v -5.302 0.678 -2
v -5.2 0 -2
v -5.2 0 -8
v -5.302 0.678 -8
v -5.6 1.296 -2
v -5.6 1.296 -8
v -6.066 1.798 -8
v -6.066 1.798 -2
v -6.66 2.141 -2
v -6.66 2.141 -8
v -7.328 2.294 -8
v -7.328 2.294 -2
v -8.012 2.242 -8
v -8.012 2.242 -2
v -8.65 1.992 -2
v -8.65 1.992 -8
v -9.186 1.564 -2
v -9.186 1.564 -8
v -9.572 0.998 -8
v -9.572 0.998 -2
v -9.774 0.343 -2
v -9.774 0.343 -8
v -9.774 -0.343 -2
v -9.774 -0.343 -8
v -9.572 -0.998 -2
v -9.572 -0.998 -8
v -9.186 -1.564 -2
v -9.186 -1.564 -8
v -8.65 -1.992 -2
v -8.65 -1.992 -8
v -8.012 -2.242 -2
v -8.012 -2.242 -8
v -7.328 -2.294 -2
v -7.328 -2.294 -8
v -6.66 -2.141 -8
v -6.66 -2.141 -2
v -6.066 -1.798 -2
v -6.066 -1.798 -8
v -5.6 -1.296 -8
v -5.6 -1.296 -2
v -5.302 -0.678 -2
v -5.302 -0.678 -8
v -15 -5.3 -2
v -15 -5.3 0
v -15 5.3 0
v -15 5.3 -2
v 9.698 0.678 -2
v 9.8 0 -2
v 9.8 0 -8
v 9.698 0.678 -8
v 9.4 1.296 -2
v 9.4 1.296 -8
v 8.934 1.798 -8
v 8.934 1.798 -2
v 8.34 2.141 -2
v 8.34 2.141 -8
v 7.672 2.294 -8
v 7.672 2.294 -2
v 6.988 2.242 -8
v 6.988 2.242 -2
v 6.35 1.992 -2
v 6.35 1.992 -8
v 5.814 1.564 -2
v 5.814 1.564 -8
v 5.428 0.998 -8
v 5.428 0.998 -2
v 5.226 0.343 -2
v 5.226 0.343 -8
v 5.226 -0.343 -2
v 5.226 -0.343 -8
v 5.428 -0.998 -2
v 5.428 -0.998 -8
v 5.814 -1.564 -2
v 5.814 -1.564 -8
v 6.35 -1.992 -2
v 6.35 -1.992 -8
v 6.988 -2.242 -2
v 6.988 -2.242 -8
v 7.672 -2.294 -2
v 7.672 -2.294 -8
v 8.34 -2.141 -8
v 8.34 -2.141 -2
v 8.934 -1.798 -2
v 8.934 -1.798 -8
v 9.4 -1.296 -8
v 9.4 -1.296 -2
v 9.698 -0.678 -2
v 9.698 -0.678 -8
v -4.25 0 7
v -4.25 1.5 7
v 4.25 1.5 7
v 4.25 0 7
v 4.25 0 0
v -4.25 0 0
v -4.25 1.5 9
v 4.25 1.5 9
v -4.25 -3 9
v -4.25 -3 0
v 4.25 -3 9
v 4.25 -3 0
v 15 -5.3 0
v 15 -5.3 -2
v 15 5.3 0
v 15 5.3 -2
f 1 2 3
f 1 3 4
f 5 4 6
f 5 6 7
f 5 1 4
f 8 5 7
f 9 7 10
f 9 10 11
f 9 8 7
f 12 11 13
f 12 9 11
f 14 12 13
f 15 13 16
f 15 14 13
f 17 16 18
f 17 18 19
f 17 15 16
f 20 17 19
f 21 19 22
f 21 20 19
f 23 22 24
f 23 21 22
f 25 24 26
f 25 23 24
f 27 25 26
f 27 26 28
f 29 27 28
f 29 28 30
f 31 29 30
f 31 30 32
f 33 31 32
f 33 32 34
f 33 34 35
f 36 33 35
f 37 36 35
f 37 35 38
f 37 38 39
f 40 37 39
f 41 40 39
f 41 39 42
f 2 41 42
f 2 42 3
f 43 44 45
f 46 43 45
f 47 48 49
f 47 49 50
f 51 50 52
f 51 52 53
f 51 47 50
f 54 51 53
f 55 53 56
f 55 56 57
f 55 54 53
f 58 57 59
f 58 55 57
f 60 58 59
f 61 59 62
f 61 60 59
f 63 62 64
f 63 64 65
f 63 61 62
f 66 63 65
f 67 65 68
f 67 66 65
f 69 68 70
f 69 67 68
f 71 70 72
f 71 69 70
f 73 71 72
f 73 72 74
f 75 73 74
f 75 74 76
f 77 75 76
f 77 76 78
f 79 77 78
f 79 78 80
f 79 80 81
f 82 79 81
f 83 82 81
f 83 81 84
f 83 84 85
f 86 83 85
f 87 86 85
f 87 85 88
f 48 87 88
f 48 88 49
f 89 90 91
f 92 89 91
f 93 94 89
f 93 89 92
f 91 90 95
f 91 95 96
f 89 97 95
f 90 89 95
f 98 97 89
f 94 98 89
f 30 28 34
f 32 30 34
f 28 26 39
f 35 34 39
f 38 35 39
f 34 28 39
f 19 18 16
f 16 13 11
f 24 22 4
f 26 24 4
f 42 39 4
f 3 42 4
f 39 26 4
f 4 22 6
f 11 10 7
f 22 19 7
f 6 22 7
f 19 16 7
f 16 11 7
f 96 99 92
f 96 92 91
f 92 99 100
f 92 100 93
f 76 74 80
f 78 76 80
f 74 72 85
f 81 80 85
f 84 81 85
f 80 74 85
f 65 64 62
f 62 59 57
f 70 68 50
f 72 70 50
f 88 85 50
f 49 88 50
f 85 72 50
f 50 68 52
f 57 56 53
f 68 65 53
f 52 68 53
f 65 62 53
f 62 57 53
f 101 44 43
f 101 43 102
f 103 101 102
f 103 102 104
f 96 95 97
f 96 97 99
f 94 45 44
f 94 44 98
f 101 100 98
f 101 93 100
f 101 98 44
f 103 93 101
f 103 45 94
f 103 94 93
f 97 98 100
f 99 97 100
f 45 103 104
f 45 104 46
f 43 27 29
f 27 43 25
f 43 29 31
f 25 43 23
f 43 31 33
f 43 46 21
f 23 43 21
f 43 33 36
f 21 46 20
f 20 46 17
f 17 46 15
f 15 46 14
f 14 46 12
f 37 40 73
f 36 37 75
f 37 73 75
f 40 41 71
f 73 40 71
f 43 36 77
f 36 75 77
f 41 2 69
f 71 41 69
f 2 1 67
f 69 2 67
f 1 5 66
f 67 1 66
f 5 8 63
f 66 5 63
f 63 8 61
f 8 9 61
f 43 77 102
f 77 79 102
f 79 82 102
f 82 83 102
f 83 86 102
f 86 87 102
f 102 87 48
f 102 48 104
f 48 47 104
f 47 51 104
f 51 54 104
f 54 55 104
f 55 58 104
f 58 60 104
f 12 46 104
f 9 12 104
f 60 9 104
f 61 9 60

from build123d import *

# Parameters (mm, degrees)
F0_W     = 15
F0_H     = 10.6
F0_R     = 2.3
F1_DEPTH = 2
F2_DEPTH = 8
F3_W     = 8.5
F3_H     = 3
F4_DEPTH = 9
F5_START = 7
F3_H_2   = 1.5
F5_DEPTH = 2


# Not quite as in the source:
# - a feature names something its author has since deleted; it is built from what else it names


with BuildPart() as f1:
    # F0 (on Top) → F1 (new body)
    with BuildSketch(Plane.XY):
        with Locations((-7.5, 0)):
            Rectangle(F0_W, F0_H)
        with Locations((-7.5, 0)):
            Circle(F0_R, mode=Mode.SUBTRACT)
        with Locations((7.5, 0)):
            Rectangle(F0_W, F0_H)
        with Locations((7.5, 0)):
            Circle(F0_R, mode=Mode.SUBTRACT)
    extrude(amount=-F1_DEPTH)

    # F0 (on Top) → F2 (join)
    with BuildSketch(Plane.XY):
        with Locations((-7.5, 0)):
            Circle(F0_R)
        with Locations((7.5, 0)):
            Circle(F0_R)
    extrude(amount=-F2_DEPTH)

    # F3 (on Top) → F4 (join)
    with BuildSketch(Plane.XY):
        with Locations((0, -1.5)):
            Rectangle(F3_W, F3_H)
    extrude(amount=F4_DEPTH)

    # F3 (on Top) → F5 (join)
    with BuildSketch(Plane.XY.offset(F5_START)):
        with Locations((0, 0.75)):
            Rectangle(F3_W, F3_H_2)
    extrude(amount=F5_DEPTH)


solid = f1.part
